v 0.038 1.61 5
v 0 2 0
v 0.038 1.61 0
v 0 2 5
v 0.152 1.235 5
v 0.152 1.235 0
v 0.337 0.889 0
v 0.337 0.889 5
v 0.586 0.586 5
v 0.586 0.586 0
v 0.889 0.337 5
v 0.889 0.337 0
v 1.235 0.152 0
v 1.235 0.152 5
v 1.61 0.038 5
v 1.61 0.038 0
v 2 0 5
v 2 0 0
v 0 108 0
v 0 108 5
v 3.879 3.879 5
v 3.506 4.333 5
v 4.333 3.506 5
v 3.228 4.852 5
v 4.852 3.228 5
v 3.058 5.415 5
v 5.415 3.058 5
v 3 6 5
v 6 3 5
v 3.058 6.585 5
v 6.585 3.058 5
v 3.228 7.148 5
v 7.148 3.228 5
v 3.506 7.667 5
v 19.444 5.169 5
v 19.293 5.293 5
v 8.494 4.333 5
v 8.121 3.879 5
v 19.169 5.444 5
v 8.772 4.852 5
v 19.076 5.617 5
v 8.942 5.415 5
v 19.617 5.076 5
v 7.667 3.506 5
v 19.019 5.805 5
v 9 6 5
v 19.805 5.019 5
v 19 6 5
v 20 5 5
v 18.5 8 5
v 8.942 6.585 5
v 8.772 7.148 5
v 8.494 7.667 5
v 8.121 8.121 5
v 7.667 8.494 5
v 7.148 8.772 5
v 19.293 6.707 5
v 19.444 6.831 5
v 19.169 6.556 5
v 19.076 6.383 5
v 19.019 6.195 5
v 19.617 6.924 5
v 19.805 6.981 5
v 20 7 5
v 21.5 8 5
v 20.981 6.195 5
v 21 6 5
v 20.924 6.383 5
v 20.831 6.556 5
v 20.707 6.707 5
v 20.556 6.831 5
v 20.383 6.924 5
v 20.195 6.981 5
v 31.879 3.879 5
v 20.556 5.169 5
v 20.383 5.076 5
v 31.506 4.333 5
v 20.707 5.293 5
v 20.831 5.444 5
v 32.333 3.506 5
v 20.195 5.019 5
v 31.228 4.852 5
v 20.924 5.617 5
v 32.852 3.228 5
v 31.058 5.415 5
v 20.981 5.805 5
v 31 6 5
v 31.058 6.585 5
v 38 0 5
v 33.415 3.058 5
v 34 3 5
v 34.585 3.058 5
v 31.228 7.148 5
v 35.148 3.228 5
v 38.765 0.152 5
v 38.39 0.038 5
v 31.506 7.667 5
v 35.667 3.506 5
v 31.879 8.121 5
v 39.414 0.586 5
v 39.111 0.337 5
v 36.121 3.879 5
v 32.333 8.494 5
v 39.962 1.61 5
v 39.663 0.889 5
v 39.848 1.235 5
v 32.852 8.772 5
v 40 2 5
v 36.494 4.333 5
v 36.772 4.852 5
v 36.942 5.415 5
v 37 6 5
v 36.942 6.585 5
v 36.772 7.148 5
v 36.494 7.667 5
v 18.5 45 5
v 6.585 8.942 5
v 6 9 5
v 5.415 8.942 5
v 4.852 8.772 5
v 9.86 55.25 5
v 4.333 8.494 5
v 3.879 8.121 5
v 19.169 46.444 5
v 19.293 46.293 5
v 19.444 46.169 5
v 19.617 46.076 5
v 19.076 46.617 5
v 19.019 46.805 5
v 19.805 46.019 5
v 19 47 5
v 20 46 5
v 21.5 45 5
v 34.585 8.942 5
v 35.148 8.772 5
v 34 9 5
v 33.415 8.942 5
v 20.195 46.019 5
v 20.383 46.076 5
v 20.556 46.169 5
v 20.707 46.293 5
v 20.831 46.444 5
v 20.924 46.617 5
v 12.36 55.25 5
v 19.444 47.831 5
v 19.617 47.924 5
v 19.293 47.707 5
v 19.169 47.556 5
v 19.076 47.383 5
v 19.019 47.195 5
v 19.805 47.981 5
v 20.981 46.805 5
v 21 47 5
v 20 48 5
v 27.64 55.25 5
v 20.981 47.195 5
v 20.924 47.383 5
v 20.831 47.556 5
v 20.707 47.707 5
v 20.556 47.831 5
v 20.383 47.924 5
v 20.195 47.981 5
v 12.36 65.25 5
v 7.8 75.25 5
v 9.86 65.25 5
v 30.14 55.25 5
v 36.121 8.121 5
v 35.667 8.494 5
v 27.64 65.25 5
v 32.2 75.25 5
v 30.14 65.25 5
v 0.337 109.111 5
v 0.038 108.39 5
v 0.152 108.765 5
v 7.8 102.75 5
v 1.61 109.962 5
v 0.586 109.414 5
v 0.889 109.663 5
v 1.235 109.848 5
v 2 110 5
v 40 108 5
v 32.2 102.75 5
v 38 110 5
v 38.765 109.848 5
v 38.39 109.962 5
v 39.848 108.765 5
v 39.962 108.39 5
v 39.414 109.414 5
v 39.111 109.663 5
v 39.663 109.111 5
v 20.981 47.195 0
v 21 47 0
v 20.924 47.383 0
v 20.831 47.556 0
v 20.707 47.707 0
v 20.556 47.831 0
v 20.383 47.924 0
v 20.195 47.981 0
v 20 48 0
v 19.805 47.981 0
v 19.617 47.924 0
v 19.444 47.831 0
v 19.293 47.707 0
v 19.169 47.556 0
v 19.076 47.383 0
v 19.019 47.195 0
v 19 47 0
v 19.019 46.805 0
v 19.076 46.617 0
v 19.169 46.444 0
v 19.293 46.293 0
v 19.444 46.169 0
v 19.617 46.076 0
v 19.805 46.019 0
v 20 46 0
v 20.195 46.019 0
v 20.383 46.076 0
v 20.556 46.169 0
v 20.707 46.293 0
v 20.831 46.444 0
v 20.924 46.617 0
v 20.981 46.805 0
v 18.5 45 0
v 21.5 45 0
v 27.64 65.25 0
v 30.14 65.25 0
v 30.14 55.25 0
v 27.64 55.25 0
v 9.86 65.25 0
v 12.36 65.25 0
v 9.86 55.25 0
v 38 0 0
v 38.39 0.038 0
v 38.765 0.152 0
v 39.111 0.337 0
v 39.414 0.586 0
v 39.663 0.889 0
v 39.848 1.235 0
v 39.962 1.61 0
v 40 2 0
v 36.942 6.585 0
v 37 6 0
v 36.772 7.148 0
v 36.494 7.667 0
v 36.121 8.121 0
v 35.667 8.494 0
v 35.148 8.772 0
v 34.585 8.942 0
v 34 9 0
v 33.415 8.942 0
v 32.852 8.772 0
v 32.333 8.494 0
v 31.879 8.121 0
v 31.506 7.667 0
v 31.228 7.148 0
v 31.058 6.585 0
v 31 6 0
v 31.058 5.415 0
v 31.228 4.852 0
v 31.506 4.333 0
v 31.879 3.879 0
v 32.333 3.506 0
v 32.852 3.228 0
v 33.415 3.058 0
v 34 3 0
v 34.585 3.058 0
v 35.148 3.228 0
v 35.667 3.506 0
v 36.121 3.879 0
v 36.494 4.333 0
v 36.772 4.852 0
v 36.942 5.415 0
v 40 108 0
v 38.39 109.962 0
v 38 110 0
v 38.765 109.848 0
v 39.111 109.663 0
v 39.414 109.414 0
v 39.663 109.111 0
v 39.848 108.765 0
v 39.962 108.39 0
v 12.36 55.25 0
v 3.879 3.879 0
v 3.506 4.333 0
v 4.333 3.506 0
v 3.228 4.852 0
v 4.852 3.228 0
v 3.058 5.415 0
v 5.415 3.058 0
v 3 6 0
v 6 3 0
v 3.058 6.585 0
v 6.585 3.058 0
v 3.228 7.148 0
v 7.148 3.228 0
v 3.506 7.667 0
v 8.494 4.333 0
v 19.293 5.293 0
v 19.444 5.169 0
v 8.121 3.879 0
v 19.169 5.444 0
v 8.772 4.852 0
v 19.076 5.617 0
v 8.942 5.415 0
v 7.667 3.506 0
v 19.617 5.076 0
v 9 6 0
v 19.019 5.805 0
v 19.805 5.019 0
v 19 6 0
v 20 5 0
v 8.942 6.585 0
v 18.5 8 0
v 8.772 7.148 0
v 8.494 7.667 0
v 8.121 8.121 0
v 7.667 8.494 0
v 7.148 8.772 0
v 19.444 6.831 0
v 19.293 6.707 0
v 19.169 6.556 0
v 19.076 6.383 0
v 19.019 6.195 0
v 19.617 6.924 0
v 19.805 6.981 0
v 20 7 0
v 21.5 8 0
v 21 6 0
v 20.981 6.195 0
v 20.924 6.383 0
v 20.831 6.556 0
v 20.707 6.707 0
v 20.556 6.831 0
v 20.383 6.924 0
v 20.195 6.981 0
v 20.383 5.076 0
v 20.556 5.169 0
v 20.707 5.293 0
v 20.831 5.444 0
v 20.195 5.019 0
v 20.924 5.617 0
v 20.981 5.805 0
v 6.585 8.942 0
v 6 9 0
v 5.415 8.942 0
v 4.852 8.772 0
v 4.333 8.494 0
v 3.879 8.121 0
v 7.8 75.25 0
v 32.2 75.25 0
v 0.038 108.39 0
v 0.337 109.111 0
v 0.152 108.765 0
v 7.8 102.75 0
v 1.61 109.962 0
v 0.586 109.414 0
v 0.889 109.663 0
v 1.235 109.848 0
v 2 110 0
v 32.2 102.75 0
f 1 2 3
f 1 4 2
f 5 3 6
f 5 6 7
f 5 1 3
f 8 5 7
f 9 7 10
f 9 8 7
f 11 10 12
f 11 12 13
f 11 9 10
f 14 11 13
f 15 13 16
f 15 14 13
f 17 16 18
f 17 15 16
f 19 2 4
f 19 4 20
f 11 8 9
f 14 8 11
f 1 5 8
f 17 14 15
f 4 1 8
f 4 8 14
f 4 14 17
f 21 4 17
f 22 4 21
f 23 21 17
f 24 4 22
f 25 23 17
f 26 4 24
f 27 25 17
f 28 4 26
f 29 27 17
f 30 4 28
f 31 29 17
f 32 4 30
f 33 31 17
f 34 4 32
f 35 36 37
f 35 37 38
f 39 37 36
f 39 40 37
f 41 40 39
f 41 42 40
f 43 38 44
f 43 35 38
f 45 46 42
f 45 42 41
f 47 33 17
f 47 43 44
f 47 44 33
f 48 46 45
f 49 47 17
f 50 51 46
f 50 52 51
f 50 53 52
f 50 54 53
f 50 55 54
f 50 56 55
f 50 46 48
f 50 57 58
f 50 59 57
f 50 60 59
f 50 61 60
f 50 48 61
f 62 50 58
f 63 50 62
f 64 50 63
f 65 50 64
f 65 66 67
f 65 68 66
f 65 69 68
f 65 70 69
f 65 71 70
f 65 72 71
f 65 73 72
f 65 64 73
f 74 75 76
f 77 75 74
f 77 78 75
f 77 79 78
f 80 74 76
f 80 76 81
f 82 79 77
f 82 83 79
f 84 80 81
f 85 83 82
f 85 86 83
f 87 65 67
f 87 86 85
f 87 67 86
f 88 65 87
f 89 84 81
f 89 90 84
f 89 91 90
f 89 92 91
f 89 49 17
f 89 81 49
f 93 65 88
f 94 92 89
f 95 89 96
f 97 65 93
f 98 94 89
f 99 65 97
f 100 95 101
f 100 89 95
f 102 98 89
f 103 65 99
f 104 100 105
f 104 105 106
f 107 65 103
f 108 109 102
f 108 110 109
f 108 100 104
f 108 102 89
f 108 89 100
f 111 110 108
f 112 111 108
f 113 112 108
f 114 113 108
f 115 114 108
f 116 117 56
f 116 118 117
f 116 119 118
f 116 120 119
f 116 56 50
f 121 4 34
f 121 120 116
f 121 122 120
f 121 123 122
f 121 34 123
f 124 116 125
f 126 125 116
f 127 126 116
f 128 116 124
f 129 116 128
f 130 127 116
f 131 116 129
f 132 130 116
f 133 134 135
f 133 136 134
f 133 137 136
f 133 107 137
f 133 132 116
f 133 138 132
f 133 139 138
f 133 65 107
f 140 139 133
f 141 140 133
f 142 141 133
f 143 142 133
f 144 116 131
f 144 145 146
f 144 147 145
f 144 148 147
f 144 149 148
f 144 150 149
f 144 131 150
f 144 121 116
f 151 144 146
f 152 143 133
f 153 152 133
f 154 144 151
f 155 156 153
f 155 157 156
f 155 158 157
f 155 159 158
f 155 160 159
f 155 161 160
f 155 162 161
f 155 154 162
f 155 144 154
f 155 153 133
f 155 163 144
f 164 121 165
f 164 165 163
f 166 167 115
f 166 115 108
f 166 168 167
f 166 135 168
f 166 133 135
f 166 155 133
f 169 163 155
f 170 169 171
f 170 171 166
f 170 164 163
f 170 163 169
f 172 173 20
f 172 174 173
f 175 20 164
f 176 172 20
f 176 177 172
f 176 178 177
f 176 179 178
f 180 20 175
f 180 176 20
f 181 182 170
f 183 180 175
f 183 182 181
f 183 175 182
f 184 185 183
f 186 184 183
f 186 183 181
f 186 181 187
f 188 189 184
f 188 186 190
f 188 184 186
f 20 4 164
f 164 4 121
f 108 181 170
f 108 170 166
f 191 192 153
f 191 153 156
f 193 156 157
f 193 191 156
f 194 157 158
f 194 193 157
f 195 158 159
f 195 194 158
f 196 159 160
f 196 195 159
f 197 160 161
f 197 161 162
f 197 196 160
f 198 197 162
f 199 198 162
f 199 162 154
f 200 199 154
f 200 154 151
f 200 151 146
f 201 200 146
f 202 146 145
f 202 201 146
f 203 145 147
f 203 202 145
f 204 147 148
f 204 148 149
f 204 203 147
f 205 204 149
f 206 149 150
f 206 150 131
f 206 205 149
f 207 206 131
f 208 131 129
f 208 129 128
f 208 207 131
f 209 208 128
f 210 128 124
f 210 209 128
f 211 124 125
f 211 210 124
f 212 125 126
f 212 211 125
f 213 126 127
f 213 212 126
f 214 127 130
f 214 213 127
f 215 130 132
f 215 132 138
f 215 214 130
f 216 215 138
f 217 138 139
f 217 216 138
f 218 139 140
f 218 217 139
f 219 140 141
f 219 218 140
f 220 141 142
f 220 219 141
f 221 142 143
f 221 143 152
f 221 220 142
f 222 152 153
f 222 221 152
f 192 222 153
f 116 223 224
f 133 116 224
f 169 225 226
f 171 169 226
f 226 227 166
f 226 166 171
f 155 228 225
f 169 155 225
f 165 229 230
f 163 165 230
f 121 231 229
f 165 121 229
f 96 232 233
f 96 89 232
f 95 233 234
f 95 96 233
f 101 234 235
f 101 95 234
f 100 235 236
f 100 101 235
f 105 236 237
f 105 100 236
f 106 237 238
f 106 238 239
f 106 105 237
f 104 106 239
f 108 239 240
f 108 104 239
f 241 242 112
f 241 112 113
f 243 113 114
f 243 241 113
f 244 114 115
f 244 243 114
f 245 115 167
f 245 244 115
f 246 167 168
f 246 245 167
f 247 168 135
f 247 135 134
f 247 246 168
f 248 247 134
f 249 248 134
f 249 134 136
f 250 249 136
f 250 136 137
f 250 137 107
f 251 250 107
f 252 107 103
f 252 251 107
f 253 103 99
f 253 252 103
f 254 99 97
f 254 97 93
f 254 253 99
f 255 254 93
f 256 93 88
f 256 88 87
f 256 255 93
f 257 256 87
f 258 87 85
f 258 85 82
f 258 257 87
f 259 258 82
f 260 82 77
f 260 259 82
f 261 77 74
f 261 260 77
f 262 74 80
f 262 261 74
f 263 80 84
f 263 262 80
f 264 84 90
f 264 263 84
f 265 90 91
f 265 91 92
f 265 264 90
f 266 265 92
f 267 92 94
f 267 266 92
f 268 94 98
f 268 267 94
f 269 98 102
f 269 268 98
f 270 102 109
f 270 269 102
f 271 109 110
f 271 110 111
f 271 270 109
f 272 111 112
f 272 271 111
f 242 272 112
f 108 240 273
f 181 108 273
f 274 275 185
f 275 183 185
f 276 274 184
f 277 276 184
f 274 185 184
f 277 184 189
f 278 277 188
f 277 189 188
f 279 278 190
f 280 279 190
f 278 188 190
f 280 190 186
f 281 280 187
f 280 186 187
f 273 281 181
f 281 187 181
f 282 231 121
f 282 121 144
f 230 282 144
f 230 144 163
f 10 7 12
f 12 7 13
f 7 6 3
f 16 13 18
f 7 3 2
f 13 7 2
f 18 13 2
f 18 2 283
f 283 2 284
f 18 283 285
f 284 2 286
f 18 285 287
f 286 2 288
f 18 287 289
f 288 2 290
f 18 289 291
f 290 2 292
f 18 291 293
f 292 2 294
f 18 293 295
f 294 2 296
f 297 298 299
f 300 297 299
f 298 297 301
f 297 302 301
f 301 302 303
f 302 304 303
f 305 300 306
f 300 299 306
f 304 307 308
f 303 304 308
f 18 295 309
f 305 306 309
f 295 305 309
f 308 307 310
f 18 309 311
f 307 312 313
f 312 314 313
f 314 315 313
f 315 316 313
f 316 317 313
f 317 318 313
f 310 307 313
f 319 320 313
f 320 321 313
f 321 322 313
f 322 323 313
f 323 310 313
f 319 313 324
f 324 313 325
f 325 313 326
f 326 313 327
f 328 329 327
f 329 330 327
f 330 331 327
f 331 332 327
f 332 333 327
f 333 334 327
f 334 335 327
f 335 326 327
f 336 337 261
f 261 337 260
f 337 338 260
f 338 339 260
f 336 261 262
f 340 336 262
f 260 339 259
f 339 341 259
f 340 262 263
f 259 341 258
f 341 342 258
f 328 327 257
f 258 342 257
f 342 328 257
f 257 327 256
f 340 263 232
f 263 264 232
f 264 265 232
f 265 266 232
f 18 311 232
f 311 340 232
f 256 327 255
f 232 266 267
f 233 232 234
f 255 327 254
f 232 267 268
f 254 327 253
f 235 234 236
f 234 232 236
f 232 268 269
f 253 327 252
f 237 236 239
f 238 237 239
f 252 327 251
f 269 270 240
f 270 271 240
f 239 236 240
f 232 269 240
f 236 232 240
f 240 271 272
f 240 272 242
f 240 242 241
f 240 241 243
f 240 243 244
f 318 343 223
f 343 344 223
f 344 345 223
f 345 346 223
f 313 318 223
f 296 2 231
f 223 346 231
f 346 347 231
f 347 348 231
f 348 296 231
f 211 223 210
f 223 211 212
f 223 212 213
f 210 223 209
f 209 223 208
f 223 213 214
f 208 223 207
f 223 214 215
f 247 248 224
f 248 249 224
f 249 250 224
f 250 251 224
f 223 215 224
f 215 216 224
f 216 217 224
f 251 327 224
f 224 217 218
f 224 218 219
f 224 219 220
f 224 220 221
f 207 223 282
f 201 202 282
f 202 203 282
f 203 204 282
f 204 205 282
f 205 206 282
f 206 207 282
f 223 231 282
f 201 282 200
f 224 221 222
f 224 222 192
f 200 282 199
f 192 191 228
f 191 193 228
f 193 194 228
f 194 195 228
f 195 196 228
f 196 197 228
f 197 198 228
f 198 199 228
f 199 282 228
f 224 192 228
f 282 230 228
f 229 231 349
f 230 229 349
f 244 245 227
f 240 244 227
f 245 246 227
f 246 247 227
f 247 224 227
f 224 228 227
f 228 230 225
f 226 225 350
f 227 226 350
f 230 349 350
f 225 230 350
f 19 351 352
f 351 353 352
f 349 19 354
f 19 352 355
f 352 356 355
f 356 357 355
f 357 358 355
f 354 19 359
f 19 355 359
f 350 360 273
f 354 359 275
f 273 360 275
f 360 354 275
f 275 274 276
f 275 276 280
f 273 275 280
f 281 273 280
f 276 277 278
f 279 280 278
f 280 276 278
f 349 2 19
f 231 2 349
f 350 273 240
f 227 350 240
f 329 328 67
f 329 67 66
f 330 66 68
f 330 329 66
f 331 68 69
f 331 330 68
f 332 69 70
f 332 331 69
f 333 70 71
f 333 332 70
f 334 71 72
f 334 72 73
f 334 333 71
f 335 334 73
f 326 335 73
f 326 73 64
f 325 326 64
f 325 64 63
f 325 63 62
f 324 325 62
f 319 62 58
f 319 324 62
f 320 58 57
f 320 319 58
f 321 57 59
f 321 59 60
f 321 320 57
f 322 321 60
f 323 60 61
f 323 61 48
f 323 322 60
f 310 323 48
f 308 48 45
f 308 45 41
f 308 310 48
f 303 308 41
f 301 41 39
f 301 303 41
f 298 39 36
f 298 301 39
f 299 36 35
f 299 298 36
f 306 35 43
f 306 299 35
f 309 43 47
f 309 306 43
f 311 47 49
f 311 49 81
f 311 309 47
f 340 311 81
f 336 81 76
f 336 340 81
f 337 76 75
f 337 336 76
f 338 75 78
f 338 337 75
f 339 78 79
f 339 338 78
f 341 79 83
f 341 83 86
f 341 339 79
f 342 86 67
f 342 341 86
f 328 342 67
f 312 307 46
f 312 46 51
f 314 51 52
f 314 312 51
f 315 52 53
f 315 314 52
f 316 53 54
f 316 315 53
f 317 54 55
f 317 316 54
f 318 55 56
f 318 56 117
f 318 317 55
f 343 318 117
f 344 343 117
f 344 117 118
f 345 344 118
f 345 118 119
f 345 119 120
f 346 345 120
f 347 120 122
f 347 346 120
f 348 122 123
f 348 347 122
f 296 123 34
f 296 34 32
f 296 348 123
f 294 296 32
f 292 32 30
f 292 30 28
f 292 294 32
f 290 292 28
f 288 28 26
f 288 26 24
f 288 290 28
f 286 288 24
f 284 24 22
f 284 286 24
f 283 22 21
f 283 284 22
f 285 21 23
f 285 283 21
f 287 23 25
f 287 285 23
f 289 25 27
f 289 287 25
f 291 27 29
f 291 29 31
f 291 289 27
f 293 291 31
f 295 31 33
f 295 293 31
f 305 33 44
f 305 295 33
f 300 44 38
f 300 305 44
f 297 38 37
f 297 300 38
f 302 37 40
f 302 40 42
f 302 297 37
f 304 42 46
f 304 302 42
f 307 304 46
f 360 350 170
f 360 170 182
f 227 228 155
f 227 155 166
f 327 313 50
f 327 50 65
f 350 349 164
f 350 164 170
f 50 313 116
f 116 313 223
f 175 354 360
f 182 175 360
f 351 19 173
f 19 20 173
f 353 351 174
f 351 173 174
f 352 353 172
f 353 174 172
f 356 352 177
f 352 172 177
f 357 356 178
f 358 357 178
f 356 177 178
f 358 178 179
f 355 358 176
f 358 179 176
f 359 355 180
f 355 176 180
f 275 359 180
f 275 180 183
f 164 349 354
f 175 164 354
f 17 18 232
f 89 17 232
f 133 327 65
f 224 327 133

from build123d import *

# Parameters (mm, degrees)
MODEL_W             = 40
MODEL_H             = 110
MODEL_R             = 3
MODEL_R_2           = 1
MODEL_W_2           = 3
MODEL_H_2           = 37
MODEL_W_3           = 24.4
MODEL_H_3           = 27.5
MODEL_W_4           = 2.5
MODEL_H_4           = 10
BOSS_EXTRUDE1_DEPTH = 5
FILLET1_R           = 2


with BuildPart() as part:
    # Model → Boss-Extrude1 (new body)
    with BuildSketch(Plane.XY):
        with Locations((20, 55)):
            Rectangle(MODEL_W, MODEL_H)
        with Locations((34, 6)):
            Circle(MODEL_R, mode=Mode.SUBTRACT)
        with Locations((6, 6)):
            Circle(MODEL_R, mode=Mode.SUBTRACT)
        with Locations((20, 6)):
            Circle(MODEL_R_2, mode=Mode.SUBTRACT)
        with Locations((20, 47)):
            Circle(MODEL_R_2, mode=Mode.SUBTRACT)
        with Locations((20, 26.5)):
            Rectangle(MODEL_W_2, MODEL_H_2, mode=Mode.SUBTRACT)
        with Locations((20, 89)):
            Rectangle(MODEL_W_3, MODEL_H_3, mode=Mode.SUBTRACT)
        with Locations((11.11, 60.25)):
            Rectangle(MODEL_W_4, MODEL_H_4, mode=Mode.SUBTRACT)
        with Locations((28.89, 60.25)):
            Rectangle(MODEL_W_4, MODEL_H_4, mode=Mode.SUBTRACT)
    extrude(amount=BOSS_EXTRUDE1_DEPTH)

    # Fillet1
    fillet1_edges = [part.edges().sort_by_distance(p)[0] for p in [
        (0, 0, 2.5),
        (0, 110, 2.5),
        (40, 110, 2.5),
        (40, 0, 2.5),
    ]]
    fillet(fillet1_edges, radius=FILLET1_R)


solid = part.part
